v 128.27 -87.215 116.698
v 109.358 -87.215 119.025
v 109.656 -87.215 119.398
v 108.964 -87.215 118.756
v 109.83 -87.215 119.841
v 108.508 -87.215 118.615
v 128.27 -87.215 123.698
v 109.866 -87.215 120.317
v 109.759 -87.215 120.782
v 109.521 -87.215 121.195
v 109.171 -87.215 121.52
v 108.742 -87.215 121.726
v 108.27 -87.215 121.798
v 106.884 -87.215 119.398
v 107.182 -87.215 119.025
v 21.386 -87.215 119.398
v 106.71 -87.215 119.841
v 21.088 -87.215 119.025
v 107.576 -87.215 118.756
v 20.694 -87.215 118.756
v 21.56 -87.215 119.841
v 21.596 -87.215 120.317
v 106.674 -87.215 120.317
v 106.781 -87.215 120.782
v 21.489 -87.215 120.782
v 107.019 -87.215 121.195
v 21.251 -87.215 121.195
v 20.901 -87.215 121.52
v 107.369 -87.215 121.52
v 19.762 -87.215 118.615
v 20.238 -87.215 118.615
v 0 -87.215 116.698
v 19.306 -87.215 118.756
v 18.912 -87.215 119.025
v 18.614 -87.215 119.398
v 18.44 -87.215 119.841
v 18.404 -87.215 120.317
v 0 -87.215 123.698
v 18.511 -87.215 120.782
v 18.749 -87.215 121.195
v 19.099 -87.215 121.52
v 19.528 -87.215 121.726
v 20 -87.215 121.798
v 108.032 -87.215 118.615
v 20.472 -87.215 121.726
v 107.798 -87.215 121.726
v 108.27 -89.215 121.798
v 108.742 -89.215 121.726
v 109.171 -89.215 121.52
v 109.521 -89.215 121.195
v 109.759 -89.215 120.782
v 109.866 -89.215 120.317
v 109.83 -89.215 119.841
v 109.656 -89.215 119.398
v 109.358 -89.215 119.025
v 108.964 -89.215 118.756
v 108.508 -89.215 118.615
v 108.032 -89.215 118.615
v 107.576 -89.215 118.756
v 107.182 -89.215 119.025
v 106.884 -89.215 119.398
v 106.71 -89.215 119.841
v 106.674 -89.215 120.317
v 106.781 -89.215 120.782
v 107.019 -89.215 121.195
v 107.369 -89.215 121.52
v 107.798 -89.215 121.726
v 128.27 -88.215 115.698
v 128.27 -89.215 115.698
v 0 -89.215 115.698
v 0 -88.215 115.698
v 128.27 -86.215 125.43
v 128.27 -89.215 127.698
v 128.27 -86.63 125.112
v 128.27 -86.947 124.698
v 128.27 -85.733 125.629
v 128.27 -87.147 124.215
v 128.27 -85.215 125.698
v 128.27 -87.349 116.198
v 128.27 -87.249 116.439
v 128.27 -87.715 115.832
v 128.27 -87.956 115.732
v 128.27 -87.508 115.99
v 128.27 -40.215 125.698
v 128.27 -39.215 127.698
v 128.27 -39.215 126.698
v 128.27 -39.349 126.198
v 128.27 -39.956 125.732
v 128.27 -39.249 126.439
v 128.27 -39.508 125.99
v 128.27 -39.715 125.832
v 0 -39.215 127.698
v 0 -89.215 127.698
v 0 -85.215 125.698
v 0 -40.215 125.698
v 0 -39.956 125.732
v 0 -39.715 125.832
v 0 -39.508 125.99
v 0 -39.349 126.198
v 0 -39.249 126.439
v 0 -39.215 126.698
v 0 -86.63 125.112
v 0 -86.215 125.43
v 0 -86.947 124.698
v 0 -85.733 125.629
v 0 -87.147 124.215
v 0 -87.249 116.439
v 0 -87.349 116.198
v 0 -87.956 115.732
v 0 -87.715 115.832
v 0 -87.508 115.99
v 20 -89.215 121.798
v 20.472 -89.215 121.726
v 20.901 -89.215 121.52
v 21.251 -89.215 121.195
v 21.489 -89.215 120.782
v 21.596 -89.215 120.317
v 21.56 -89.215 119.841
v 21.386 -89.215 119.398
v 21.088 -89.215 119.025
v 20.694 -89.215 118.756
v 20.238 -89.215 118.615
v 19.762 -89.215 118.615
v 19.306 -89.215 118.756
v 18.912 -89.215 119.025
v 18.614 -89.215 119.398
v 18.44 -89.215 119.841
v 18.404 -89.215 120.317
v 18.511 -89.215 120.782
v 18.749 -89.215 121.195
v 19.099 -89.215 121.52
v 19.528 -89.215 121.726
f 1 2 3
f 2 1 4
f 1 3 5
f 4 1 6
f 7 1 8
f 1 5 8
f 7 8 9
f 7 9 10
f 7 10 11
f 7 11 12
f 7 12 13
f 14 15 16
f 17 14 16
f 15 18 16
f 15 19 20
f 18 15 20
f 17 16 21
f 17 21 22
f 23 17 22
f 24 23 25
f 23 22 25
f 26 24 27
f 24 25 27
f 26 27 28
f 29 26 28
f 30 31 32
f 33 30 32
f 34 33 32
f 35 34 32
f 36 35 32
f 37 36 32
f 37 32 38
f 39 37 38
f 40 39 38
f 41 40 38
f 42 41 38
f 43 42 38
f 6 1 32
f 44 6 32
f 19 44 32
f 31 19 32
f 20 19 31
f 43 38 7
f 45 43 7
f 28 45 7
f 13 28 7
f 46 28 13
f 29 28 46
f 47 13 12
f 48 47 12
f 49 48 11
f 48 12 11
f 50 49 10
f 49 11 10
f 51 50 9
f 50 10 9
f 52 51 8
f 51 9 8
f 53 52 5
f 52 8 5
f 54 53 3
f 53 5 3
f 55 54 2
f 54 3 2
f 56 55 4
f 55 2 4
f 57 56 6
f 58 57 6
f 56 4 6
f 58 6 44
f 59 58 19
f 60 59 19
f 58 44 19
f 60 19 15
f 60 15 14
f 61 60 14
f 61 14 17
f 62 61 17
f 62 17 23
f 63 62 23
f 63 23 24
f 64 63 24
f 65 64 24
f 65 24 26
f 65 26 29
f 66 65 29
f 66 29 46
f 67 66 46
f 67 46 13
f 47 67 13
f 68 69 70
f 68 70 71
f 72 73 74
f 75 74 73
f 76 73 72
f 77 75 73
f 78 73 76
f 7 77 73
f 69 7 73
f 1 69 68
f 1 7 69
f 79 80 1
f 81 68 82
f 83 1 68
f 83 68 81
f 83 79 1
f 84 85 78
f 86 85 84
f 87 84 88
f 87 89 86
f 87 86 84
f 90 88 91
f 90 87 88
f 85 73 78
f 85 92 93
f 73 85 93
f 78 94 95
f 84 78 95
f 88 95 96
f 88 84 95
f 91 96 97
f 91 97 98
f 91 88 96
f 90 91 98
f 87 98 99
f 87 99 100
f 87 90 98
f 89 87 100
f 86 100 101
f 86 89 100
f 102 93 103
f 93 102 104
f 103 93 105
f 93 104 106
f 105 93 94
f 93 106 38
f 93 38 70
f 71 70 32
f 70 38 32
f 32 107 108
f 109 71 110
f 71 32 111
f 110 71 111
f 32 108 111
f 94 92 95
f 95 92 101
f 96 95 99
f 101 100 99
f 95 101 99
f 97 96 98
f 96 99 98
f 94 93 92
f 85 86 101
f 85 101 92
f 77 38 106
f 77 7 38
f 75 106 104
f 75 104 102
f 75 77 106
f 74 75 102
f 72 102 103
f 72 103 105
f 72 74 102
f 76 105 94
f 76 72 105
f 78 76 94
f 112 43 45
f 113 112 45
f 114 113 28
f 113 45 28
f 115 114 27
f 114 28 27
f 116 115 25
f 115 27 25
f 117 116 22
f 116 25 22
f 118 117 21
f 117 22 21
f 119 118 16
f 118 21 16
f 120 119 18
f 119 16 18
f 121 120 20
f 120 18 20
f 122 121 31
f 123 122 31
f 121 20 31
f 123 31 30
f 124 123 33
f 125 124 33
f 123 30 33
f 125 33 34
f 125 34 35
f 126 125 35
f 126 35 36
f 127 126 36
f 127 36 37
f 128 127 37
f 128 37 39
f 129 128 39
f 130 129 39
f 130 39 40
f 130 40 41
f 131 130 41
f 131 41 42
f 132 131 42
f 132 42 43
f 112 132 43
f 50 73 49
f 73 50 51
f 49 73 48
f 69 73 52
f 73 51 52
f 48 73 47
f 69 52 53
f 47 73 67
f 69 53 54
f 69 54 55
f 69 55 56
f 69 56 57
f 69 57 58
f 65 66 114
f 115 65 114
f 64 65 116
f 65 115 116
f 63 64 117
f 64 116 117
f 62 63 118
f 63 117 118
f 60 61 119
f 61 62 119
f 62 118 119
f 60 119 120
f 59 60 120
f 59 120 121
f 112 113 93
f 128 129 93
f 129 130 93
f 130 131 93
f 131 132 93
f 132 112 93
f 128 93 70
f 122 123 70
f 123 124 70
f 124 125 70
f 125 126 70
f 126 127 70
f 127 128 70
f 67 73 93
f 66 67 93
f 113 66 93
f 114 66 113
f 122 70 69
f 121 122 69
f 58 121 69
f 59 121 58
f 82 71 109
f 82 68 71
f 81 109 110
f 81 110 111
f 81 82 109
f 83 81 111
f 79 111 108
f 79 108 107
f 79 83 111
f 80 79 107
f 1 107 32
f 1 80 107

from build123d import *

# Parameters (mm, degrees)
BOSS_EXTRUDE1_DEPTH = 128.27
FILLET1_R           = 1
FILLET2_R           = 2
SKETCH2_R           = 1.6
CUT_EXTRUDE1_DEPTH  = 188.253444223


with BuildPart() as part:
    # Sketch1 → Boss-Extrude1 (new body)
    with BuildSketch(Plane(origin=(0, 0, 0), x_dir=(0, 0, -1), z_dir=(1, 0, 0))):
        Polygon((-127.697531195, -39.21530097), (-127.697531195, -89.21530097), (-115.697531195, -89.21530097), (-115.697531195, -87.21530097), (-125.697531195, -87.21530097), (-125.697531195, -39.21530097), align=None)
    extrude(amount=BOSS_EXTRUDE1_DEPTH)

    # Fillet1
    fillet1_edges = [part.edges().sort_by_distance(p)[0] for p in [
        (64.135, -39.21530097, 125.697531195),
        (64.135, -87.21530097, 115.697531195),
    ]]
    fillet(fillet1_edges, radius=FILLET1_R)

    # Fillet2
    fillet2_edges = [part.edges().sort_by_distance(p)[0] for p in [
        (64.135, -87.21530097, 125.697531195),
    ]]
    fillet(fillet2_edges, radius=FILLET2_R)

    # Sketch2 → Cut-Extrude1 (cut, through all)
    with BuildSketch(Plane(origin=(0, -87.21530097, 0), x_dir=(1, 0, 0), z_dir=(0, 1, 0))):
        with Locations(Location((20, -120.197531195, 0), (0, 0, 270))):
            Circle(SKETCH2_R)
        with Locations(Location((108.27, -120.197531195, 0), (0, 0, 270))):
            Circle(SKETCH2_R)
    extrude(amount=-CUT_EXTRUDE1_DEPTH, mode=Mode.SUBTRACT)


solid = part.part
